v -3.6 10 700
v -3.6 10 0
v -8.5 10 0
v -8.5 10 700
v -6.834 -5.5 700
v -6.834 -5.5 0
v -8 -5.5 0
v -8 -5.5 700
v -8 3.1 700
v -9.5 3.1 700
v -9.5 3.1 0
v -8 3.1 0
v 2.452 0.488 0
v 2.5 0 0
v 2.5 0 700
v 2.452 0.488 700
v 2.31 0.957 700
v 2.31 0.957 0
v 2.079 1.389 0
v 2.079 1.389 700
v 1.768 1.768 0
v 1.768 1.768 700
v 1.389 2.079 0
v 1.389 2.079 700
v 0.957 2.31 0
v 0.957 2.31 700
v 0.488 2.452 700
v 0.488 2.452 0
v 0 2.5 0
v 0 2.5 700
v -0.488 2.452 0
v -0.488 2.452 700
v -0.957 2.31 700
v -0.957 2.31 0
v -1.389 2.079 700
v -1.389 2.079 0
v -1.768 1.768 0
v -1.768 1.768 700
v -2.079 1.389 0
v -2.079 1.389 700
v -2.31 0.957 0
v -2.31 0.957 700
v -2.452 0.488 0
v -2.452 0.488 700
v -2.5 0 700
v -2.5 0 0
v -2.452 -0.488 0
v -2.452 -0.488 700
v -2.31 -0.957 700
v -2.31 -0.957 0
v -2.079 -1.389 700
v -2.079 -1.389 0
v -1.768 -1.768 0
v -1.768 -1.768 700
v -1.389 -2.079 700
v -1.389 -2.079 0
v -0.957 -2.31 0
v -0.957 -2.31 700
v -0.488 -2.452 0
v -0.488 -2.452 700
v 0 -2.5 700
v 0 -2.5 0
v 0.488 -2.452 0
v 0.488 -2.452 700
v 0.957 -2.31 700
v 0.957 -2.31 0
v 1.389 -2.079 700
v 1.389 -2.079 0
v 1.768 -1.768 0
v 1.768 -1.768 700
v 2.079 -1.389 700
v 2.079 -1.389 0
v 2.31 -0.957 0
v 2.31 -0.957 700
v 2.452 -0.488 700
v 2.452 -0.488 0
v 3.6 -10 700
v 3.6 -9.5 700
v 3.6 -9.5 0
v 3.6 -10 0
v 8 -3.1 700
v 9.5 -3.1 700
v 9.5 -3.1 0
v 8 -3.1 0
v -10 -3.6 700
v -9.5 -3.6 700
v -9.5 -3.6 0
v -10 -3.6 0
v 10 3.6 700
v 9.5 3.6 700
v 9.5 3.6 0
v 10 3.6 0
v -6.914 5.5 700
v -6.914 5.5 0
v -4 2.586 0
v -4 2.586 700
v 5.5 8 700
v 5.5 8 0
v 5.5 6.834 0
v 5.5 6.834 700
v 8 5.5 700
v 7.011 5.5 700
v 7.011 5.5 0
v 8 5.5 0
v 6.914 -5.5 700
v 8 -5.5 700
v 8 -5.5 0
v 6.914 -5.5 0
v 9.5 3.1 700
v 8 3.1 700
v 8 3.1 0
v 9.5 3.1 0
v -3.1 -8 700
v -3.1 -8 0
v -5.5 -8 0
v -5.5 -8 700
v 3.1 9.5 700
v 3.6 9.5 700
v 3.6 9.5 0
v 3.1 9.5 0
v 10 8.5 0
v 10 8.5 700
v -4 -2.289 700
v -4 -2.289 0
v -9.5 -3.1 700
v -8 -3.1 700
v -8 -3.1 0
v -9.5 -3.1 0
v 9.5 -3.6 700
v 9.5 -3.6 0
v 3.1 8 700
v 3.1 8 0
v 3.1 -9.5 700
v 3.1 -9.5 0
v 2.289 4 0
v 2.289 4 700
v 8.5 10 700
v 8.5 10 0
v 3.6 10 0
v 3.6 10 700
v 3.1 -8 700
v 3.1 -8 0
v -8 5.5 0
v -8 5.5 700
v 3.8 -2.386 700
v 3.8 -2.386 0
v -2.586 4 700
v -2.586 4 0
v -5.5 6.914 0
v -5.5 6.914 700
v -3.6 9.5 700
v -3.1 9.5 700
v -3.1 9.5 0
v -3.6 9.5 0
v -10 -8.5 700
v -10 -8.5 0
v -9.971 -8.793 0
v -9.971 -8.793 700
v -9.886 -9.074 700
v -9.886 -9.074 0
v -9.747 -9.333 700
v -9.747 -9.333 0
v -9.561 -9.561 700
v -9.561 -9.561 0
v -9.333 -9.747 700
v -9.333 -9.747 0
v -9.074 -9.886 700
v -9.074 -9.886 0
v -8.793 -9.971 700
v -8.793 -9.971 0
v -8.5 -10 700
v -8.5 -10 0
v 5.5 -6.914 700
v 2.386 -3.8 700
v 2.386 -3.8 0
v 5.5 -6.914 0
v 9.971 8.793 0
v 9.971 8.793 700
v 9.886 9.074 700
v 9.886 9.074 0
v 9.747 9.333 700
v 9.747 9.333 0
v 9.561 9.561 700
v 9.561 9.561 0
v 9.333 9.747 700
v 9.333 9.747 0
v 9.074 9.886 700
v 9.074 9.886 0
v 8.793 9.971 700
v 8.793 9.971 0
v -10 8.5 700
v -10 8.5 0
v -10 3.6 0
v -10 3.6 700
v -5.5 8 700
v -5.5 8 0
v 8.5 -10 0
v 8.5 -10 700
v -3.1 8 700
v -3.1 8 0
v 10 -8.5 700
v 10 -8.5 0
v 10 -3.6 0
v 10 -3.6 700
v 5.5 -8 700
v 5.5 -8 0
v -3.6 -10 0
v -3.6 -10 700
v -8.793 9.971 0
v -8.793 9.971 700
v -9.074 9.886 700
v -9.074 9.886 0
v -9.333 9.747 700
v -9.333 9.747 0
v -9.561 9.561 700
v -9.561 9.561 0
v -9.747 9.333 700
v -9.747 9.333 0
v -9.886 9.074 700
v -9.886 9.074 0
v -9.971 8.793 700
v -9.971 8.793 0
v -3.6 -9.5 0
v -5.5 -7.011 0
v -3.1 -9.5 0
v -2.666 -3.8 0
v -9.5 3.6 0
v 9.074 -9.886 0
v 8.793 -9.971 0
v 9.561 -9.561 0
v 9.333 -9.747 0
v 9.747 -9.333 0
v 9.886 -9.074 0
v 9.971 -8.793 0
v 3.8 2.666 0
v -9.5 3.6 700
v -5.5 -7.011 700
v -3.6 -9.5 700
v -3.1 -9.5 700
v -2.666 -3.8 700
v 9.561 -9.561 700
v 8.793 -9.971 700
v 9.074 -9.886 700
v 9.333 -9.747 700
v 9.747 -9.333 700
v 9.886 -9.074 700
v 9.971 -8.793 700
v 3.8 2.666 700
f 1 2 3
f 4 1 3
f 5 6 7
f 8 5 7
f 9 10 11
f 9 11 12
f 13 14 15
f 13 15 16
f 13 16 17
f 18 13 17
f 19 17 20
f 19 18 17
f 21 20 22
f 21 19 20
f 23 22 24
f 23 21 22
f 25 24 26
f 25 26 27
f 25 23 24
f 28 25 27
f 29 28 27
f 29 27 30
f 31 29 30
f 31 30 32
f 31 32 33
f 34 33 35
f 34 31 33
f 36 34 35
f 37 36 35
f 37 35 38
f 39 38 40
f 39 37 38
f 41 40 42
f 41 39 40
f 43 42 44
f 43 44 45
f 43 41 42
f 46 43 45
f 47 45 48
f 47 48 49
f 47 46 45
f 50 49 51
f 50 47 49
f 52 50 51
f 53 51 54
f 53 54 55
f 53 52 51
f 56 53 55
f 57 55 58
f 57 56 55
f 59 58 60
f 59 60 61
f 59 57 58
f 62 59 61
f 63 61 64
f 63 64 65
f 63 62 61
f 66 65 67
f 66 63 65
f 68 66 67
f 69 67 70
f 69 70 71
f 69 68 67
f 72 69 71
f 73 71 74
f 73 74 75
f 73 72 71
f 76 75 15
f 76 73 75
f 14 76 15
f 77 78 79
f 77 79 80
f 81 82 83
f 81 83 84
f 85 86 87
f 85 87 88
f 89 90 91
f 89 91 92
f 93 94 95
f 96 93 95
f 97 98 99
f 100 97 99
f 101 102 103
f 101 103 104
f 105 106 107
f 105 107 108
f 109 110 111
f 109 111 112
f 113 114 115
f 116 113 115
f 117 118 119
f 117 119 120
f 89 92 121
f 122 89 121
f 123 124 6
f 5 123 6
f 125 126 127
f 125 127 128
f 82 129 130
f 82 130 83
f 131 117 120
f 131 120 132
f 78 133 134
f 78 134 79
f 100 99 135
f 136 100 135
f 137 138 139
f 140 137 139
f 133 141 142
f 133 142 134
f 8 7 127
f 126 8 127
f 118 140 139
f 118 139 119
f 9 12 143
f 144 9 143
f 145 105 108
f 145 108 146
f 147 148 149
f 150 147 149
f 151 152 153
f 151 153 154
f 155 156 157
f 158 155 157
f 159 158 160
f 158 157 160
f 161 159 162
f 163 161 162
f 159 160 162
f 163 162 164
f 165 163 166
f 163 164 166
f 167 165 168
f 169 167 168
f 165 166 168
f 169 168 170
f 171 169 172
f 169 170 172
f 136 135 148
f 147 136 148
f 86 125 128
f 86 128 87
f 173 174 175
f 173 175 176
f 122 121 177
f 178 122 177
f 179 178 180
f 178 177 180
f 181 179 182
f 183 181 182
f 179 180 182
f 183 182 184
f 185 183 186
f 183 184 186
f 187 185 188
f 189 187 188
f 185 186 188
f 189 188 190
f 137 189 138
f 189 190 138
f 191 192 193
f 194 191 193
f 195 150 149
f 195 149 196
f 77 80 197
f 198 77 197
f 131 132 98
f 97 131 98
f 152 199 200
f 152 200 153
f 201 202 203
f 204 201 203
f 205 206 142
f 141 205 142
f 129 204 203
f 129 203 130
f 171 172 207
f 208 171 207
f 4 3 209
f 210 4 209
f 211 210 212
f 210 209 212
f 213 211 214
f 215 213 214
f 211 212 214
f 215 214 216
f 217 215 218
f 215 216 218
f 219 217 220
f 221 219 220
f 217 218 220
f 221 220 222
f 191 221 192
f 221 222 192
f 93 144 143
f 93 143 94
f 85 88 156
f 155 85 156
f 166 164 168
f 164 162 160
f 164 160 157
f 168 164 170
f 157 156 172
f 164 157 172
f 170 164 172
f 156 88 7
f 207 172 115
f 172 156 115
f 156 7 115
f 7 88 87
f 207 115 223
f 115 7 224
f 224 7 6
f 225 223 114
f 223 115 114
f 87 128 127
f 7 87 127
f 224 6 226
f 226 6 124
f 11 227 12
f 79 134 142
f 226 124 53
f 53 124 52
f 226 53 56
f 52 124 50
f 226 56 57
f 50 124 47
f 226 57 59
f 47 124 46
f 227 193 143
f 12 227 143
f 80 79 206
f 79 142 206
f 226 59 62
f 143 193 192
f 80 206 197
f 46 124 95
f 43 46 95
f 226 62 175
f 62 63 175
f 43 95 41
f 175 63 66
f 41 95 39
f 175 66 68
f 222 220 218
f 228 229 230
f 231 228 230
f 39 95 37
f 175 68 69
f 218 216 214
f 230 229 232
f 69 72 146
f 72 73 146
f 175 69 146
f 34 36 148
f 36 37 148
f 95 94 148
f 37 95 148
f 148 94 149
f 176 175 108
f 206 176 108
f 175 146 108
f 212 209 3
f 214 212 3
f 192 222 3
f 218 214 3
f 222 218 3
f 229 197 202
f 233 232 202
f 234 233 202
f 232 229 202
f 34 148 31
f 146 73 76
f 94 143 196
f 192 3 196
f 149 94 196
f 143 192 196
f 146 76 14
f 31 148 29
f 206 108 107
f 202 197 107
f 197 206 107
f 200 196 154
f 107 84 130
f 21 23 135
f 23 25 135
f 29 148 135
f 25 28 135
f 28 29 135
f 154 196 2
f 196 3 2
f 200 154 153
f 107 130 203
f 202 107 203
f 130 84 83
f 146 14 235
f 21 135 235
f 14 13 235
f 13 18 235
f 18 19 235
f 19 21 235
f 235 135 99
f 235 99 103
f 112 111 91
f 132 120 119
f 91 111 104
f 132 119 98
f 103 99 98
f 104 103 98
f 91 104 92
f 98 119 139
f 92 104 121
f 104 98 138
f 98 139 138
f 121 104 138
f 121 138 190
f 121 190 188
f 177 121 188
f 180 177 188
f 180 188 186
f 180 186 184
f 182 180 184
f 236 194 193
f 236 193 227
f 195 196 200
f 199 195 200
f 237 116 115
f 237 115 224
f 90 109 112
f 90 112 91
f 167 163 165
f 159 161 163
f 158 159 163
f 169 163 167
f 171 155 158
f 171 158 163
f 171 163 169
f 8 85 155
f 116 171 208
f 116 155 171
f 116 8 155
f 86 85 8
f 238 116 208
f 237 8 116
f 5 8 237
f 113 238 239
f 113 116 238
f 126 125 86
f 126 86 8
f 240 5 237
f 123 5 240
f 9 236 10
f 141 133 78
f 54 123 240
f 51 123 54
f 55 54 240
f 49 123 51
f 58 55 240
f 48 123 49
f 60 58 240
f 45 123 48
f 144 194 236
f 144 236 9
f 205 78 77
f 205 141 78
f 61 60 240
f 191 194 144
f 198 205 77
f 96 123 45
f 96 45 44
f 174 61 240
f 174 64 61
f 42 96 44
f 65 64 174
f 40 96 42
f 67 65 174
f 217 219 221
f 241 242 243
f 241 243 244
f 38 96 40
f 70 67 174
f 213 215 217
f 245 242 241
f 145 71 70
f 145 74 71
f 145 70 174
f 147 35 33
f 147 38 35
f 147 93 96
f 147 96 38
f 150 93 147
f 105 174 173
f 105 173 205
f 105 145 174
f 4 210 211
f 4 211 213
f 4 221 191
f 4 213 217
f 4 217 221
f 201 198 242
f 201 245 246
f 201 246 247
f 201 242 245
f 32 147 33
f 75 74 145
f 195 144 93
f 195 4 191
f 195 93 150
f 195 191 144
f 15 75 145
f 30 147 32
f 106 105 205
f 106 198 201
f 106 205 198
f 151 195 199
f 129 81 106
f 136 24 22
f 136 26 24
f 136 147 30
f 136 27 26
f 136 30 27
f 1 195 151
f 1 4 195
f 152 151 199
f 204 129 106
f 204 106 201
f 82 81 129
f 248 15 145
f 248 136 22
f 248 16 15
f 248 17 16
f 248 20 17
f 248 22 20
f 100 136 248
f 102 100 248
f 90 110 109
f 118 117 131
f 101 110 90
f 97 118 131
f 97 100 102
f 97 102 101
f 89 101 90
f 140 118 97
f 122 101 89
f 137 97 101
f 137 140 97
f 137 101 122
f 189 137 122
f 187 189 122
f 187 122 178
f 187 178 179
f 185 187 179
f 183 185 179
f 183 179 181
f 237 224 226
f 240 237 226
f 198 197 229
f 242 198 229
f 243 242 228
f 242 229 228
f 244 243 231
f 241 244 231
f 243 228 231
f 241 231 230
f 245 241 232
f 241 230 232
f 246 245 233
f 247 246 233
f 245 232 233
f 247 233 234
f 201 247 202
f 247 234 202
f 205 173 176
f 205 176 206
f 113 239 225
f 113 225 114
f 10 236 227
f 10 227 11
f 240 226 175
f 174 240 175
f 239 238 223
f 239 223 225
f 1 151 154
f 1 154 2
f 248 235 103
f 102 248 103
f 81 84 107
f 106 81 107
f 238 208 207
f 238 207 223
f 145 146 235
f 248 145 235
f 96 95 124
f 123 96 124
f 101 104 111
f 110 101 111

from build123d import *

# Parameters (mm, degrees)
F0_R     = 2.5
F1_DEPTH = 700


with BuildPart() as f1:
    # F0 (on Top) → F1 (new body)
    with BuildSketch(Plane.XY):
        with BuildLine():
            Line((-3.6, 10), (-8.5, 10))
            ThreePointArc((-8.5, 10), (-9.56066, 9.56066), (-10, 8.5))
            Line((-10, 8.5), (-10, 3.6))
            Line((-10, 3.6), (-9.5, 3.6))
            Line((-9.5, 3.6), (-9.5, 3.1))
            Line((-9.5, 3.1), (-8, 3.1))
            Line((-8, 3.1), (-8, 5.5))
            Line((-8, 5.5), (-6.914214, 5.5))
            Line((-6.914214, 5.5), (-4, 2.585786))
            Line((-4, 2.585786), (-4, -2.288562))
            Line((-4, -2.288562), (-6.833622, -5.5))
            Line((-6.833622, -5.5), (-8, -5.5))
            Line((-8, -5.5), (-8, -3.1))
            Line((-8, -3.1), (-9.5, -3.1))
            Line((-9.5, -3.1), (-9.5, -3.6))
            Line((-9.5, -3.6), (-10, -3.6))
            Line((-10, -3.6), (-10, -8.5))
            ThreePointArc((-10, -8.5), (-9.56066, -9.56066), (-8.5, -10))
            Line((-8.5, -10), (-3.6, -10))
            Line((-3.6, -10), (-3.6, -9.5))
            Line((-3.6, -9.5), (-3.1, -9.5))
            Line((-3.1, -9.5), (-3.1, -8))
            Line((-3.1, -8), (-5.5, -8))
            Line((-5.5, -8), (-5.5, -7.011438))
            Line((-5.5, -7.011438), (-2.666378, -3.8))
            Line((-2.666378, -3.8), (2.385786, -3.8))
            Line((2.385786, -3.8), (5.5, -6.914214))
            Line((5.5, -6.914214), (5.5, -8))
            Line((5.5, -8), (3.1, -8))
            Line((3.1, -8), (3.1, -9.5))
            Line((3.1, -9.5), (3.6, -9.5))
            Line((3.6, -9.5), (3.6, -10))
            Line((3.6, -10), (8.5, -10))
            ThreePointArc((8.5, -10), (9.56066, -9.56066), (10, -8.5))
            Line((10, -8.5), (10, -3.6))
            Line((10, -3.6), (9.5, -3.6))
            Line((9.5, -3.6), (9.5, -3.1))
            Line((9.5, -3.1), (8, -3.1))
            Line((8, -3.1), (8, -5.5))
            Line((8, -5.5), (6.914214, -5.5))
            Line((6.914214, -5.5), (3.8, -2.385786))
            Line((3.8, -2.385786), (3.8, 2.666378))
            Line((3.8, 2.666378), (7.011438, 5.5))
            Line((7.011438, 5.5), (8, 5.5))
            Line((8, 5.5), (8, 3.1))
            Line((8, 3.1), (9.5, 3.1))
            Line((9.5, 3.1), (9.5, 3.6))
            Line((9.5, 3.6), (10, 3.6))
            Line((10, 3.6), (10, 8.5))
            ThreePointArc((10, 8.5), (9.56066, 9.56066), (8.5, 10))
            Line((8.5, 10), (3.6, 10))
            Line((3.6, 10), (3.6, 9.5))
            Line((3.6, 9.5), (3.1, 9.5))
            Line((3.1, 9.5), (3.1, 8))
            Line((3.1, 8), (5.5, 8))
            Line((5.5, 8), (5.5, 6.833622))
            Line((5.5, 6.833622), (2.288562, 4))
            Line((2.288562, 4), (-2.585786, 4))
            Line((-2.585786, 4), (-5.5, 6.914214))
            Line((-5.5, 6.914214), (-5.5, 8))
            Line((-5.5, 8), (-3.1, 8))
            Line((-3.1, 8), (-3.1, 9.5))
            Line((-3.1, 9.5), (-3.6, 9.5))
            Line((-3.6, 9.5), (-3.6, 10))
        make_face()
        Circle(F0_R, mode=Mode.SUBTRACT)
    extrude(amount=F1_DEPTH)


solid = f1.part
